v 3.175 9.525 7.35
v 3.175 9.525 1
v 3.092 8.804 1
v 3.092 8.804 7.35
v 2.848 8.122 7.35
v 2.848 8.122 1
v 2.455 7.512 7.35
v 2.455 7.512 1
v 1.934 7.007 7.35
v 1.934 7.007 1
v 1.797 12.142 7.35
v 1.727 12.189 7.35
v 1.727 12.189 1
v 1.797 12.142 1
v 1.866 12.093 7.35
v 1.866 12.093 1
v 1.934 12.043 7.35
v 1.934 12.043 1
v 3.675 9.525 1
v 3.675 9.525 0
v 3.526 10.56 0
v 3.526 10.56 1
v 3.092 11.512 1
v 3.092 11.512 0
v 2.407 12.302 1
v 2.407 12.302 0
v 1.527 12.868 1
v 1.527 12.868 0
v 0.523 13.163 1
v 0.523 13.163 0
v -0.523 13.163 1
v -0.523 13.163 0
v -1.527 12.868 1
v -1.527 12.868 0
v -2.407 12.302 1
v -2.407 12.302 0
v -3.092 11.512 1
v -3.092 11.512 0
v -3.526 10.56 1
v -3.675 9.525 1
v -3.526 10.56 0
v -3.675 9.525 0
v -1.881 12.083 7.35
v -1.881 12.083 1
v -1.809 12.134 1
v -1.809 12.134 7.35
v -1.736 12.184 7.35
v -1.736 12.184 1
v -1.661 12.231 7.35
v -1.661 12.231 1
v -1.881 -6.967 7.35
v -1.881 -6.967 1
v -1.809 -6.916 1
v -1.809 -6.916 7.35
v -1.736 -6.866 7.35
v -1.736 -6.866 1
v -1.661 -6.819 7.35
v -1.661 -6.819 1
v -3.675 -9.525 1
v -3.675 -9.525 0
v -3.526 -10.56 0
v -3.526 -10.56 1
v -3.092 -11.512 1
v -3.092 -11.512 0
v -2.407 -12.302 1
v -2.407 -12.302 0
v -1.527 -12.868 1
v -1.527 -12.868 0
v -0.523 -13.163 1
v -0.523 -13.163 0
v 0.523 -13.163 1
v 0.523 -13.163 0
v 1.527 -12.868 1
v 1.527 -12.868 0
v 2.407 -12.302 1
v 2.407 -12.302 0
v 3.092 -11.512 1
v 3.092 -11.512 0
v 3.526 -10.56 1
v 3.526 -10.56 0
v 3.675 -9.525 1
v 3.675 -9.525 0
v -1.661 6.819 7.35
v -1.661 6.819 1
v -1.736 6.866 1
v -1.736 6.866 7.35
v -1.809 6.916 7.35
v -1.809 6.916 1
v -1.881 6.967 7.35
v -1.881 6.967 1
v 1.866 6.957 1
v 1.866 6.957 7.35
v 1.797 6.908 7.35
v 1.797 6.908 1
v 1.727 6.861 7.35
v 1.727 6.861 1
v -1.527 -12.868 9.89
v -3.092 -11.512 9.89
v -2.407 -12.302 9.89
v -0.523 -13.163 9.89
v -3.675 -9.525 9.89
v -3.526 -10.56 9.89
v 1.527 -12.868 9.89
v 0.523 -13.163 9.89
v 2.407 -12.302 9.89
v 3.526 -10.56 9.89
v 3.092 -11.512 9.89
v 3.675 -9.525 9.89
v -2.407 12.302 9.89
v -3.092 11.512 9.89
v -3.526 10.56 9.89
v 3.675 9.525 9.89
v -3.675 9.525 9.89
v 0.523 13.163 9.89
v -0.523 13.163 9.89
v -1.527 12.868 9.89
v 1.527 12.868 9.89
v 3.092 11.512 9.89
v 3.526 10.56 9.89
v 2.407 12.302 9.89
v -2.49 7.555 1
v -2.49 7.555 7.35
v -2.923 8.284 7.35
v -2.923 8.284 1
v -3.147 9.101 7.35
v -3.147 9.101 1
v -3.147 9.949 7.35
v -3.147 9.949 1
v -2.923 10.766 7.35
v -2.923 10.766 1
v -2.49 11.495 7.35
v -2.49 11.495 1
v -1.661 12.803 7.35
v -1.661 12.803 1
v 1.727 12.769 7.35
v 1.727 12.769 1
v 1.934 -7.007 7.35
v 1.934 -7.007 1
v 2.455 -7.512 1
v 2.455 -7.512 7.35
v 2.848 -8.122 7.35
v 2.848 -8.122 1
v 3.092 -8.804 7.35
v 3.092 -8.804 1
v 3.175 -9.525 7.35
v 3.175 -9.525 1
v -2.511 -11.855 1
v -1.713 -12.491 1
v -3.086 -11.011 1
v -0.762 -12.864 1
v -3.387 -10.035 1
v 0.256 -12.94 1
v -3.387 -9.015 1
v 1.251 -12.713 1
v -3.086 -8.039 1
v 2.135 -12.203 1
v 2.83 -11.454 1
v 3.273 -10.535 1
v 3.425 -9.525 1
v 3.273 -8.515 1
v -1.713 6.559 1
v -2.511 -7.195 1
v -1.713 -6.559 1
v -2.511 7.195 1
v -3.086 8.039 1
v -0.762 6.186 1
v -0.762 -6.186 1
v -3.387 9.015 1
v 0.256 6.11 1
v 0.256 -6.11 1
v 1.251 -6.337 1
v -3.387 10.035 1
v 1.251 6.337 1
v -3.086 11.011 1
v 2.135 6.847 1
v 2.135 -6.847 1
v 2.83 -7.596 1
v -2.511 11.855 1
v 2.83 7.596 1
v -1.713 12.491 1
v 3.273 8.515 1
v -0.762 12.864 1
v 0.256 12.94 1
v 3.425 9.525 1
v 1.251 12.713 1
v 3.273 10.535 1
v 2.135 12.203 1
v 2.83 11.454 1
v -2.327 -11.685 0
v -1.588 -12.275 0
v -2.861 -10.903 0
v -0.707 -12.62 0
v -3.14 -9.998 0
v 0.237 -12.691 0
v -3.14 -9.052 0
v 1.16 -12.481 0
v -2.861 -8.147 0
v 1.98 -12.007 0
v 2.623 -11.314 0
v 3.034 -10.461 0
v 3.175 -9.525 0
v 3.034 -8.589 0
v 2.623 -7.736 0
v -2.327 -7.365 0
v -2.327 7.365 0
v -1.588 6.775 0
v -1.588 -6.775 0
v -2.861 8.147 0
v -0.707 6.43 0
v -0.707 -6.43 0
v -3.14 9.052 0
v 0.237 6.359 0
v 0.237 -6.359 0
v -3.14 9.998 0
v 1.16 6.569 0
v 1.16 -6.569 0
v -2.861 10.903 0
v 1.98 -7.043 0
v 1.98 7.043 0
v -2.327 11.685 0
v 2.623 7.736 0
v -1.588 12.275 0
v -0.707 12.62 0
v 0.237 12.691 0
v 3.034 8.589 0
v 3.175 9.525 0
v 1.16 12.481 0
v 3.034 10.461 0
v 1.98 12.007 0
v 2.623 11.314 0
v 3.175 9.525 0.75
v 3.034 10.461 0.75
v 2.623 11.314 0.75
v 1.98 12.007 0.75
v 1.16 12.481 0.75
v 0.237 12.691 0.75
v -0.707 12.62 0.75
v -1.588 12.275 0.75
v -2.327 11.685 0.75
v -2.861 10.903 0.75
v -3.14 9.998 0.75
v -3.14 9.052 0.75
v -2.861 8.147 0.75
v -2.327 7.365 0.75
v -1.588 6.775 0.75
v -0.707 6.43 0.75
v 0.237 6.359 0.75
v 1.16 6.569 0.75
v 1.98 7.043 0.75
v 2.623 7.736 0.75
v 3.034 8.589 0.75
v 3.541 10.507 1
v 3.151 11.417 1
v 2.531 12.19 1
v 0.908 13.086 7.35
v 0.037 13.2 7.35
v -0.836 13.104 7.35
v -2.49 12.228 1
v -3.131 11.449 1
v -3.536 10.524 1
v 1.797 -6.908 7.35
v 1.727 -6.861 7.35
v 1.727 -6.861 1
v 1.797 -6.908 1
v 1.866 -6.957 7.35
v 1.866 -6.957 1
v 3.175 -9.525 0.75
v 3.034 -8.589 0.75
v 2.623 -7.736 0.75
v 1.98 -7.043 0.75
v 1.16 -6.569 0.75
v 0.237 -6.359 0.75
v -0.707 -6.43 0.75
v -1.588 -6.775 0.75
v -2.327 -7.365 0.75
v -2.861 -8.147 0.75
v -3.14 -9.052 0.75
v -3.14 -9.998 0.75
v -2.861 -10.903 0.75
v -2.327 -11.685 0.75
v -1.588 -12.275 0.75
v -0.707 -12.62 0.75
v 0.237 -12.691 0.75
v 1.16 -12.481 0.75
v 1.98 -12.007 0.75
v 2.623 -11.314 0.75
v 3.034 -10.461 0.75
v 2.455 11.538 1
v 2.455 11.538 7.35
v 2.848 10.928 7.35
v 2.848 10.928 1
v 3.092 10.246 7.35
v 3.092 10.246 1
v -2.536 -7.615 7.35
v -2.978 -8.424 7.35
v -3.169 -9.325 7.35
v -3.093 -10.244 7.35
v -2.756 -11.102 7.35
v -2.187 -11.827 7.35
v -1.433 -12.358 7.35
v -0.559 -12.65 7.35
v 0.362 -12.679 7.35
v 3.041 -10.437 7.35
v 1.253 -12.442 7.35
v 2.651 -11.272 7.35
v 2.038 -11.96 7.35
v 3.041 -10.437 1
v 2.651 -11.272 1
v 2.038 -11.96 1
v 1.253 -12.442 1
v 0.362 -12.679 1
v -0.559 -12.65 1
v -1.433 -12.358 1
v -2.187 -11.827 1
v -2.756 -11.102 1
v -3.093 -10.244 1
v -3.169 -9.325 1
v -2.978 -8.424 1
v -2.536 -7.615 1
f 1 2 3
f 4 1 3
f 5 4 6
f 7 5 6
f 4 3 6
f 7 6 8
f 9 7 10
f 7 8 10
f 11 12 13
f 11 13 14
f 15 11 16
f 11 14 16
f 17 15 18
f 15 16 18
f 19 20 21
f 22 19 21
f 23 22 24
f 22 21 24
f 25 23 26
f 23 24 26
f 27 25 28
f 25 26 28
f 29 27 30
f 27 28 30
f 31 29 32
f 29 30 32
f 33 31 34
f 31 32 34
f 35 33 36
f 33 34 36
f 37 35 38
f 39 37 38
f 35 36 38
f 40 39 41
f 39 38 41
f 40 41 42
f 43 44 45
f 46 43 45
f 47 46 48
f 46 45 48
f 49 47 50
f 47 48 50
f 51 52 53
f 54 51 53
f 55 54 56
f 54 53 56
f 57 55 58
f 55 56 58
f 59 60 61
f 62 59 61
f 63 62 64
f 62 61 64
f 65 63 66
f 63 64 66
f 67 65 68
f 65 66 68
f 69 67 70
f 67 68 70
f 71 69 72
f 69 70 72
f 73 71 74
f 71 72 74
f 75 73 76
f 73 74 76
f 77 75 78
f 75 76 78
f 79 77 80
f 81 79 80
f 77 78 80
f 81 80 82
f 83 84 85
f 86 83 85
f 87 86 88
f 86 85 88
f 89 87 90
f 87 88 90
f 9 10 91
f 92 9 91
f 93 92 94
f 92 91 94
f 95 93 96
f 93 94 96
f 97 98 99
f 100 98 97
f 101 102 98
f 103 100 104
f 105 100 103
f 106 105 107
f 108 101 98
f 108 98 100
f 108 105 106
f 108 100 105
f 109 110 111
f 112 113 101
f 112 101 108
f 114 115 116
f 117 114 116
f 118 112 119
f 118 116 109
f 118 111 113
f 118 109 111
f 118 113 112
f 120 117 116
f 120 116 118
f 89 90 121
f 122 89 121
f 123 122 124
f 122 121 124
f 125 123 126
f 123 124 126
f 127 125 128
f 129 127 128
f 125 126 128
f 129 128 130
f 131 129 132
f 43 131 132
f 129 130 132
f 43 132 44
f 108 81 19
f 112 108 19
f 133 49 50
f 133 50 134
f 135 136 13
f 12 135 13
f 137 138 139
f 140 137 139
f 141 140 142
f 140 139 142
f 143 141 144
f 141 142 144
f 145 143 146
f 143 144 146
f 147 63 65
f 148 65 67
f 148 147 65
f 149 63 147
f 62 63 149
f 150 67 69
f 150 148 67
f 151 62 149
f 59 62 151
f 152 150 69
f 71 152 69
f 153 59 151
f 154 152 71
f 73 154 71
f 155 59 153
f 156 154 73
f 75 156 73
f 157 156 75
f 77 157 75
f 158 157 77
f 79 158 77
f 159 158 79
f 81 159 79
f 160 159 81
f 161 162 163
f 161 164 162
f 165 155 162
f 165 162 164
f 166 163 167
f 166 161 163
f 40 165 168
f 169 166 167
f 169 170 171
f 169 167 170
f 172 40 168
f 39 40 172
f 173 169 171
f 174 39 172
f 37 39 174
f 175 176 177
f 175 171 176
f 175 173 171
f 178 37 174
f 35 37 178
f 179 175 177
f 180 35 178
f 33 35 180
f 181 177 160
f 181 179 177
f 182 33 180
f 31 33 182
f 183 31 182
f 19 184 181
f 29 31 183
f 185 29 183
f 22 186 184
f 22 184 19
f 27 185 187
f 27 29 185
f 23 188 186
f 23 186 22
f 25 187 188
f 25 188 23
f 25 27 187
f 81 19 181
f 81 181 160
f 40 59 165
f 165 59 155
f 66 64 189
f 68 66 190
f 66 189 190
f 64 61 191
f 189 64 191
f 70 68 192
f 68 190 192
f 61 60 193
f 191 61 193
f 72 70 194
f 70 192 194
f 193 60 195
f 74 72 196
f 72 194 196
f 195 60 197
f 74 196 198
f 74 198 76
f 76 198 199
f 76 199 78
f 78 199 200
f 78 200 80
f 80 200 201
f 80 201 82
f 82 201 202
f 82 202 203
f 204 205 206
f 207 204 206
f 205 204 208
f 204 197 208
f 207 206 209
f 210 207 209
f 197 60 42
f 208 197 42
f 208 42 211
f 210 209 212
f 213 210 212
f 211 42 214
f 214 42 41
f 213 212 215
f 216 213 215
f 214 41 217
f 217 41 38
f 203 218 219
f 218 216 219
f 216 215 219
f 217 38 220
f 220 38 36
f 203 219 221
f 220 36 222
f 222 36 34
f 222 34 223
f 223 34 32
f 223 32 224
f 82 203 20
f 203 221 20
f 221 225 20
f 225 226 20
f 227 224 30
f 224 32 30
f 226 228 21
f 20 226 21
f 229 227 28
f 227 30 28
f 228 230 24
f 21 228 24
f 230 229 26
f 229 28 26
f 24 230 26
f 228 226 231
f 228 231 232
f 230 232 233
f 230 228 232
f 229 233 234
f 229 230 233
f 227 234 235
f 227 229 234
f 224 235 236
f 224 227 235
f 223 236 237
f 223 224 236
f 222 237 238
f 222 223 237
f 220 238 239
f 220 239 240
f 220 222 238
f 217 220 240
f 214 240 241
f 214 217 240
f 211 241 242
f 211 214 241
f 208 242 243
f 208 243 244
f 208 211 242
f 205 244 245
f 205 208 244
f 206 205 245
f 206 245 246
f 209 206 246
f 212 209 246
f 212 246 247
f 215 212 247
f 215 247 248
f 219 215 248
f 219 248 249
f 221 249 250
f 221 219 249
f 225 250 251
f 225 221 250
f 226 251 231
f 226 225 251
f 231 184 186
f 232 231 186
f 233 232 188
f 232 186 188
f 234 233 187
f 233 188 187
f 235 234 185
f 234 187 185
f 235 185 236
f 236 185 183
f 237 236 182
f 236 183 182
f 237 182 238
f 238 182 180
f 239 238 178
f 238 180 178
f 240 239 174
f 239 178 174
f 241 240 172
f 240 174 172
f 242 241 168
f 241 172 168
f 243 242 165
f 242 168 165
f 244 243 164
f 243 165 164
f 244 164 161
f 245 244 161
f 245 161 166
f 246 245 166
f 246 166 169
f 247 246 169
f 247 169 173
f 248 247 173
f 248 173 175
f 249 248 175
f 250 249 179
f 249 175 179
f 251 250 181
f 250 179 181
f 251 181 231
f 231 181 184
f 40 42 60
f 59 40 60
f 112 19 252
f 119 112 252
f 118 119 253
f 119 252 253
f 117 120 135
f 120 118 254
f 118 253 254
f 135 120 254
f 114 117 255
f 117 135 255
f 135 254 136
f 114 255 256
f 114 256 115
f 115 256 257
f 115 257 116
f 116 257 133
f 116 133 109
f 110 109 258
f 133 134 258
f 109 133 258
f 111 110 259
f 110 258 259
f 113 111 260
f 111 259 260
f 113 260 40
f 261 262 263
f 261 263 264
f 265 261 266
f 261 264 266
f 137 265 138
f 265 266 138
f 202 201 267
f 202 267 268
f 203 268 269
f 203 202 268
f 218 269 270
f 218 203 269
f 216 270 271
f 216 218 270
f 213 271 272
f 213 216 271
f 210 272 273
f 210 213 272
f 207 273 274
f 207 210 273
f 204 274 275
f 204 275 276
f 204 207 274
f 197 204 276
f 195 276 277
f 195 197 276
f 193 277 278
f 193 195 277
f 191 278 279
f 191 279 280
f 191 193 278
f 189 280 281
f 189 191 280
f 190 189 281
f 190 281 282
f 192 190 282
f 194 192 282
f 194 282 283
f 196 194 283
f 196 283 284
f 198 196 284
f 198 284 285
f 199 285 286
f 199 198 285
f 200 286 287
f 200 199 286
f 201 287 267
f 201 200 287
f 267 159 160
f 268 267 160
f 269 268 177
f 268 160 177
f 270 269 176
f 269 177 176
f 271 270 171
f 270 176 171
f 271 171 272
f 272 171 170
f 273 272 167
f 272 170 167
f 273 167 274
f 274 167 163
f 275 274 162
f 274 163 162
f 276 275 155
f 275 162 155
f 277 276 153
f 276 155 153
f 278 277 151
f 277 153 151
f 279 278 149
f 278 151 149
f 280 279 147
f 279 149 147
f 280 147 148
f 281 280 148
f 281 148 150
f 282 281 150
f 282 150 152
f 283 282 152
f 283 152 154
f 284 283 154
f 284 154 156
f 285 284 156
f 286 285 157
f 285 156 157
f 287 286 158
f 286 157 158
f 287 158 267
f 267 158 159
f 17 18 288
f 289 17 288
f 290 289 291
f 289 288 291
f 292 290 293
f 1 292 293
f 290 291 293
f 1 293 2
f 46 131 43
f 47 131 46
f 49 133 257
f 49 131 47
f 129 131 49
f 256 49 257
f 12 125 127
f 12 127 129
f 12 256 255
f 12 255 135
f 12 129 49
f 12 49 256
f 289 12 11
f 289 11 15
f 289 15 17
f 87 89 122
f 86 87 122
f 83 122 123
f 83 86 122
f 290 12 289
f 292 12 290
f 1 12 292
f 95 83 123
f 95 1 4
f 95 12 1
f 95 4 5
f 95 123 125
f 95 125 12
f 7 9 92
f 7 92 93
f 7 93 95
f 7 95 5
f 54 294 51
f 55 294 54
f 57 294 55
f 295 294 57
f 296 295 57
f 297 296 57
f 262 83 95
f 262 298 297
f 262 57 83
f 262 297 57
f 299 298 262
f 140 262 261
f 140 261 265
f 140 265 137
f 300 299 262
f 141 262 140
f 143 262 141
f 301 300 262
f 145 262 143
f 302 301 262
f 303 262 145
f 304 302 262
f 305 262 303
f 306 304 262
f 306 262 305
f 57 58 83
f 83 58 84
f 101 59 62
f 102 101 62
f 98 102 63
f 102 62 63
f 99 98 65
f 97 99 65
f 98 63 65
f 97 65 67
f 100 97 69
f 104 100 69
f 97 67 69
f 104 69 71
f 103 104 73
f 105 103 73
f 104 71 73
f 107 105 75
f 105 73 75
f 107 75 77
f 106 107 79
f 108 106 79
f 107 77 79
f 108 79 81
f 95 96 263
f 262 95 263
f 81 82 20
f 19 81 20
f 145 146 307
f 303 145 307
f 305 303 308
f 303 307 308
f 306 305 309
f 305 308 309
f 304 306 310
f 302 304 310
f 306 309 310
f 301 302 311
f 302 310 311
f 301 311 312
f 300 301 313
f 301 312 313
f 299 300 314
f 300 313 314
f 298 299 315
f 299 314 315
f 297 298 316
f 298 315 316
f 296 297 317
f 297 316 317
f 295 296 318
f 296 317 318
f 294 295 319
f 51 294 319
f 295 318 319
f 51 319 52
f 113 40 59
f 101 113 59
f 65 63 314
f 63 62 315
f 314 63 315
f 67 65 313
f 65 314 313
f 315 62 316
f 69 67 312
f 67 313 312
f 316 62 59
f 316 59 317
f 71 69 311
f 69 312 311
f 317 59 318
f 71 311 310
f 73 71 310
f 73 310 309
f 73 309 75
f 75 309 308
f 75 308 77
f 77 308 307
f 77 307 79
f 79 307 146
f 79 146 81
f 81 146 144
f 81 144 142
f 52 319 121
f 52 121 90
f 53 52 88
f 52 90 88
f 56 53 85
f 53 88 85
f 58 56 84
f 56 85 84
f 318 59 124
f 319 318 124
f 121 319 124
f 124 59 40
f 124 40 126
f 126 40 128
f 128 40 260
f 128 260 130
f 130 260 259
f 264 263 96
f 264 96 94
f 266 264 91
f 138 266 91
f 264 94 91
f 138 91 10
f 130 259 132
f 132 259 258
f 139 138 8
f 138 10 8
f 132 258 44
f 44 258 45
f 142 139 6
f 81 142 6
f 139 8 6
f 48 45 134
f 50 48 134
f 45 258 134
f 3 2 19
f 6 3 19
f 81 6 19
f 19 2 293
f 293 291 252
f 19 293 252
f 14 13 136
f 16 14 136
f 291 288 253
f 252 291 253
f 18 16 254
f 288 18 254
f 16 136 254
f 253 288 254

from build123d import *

# Parameters (mm, degrees)
F0_R     = 3.175
F1_DEPTH = 1
F2_SIZE  = 0.25
F3_DEPTH = 8.89
F6_DEPTH = 6.35
F8_DEPTH = 6.35


with BuildPart() as f1:
    # F0 (on Top) → F1 (new body)
    with BuildSketch(Plane.XY):
        with BuildLine():
            Line((3.675, -9.525), (3.675, 9.525))
            ThreePointArc((3.675, 9.525), (0, 5.85), (-3.675, 9.525))
            Line((-3.675, 9.525), (-3.675, -9.525))
            ThreePointArc((-3.675, -9.525), (0, -5.85), (3.675, -9.525))
        make_face()
        with BuildLine():
            ThreePointArc((-3.675, 9.525), (0, 5.85), (3.675, 9.525))
            ThreePointArc((3.675, 9.525), (0, 13.2), (-3.675, 9.525))
        make_face()
        with Locations((0, 9.525)):
            Circle(F0_R, mode=Mode.SUBTRACT)
        with BuildLine():
            ThreePointArc((-3.675, -9.525), (0, -13.2), (3.675, -9.525))
            ThreePointArc((3.675, -9.525), (0, -5.85), (-3.675, -9.525))
        make_face()
        with Locations((0, -9.525)):
            Circle(F0_R, mode=Mode.SUBTRACT)
    extrude(amount=F1_DEPTH)

    # F2
    f2_edges = [f1.edges().sort_by_distance(p)[0] for p in [
        (-3.175, -9.525, 1),
        (-3.175, 9.525, 1),
    ]]
    chamfer(f2_edges, length=F2_SIZE)


with BuildPart() as f3:
    # F0 (on Top) → F3 (new body)
    with BuildSketch(Plane.XY):
        with BuildLine():
            ThreePointArc((-3.675, 9.525), (0, 5.85), (3.675, 9.525))
            ThreePointArc((3.675, 9.525), (0, 13.2), (-3.675, 9.525))
        make_face()
        with Locations((0, 9.525)):
            Circle(F0_R, mode=Mode.SUBTRACT)
        with Locations((0, 9.525)):
            Circle(F0_R)
        with BuildLine():
            Line((3.675, -9.525), (3.675, 9.525))
            ThreePointArc((3.675, 9.525), (0, 5.85), (-3.675, 9.525))
            Line((-3.675, 9.525), (-3.675, -9.525))
            ThreePointArc((-3.675, -9.525), (0, -5.85), (3.675, -9.525))
        make_face()
        with BuildLine():
            ThreePointArc((-3.675, -9.525), (0, -13.2), (3.675, -9.525))
            ThreePointArc((3.675, -9.525), (0, -5.85), (-3.675, -9.525))
        make_face()
        with Locations((0, -9.525)):
            Circle(F0_R, mode=Mode.SUBTRACT)
        with Locations((0, -9.525)):
            Circle(F0_R)
    extrude(amount=F3_DEPTH)


with BuildPart() as f3_1:
    # F4: moved
    add(f3.part.moved(Location((0, 0, 1))))

    # F5 (on face) → F6 (cut)
    with BuildSketch(Plane(origin=(0, 0, 1), x_dir=(1, 0, 0), z_dir=(0, 0, -1))):
        with BuildLine():
            Line((-1.8806655426, 7.9525317997), (-1.8806655426, 6.9669300015))
            ThreePointArc((-1.8806655426, 6.9669300015), (0.0335689365, 6.3501774654), (1.9343344574, 7.0072678445))
            Line((1.9343344574, 7.0072678445), (1.9343344574, 7.9525317997))
            Line((1.9343344574, 7.9525317997), (-1.8806655426, 7.9525317997))
        make_face()
        with BuildLine():
            ThreePointArc((1.9343344574, 7.0072678445), (2.847993759, 8.1215910971), (3.175, 9.525))
            ThreePointArc((3.175, 9.525), (-1.4334419944, 12.3579964788), (-1.8806655426, 6.9669300015))
            Line((-1.8806655426, 6.9669300015), (-1.8806655426, 7.9525317997))
            Line((-1.8806655426, 7.9525317997), (1.9343344574, 7.9525317997))
            Line((1.9343344574, 7.9525317997), (1.9343344574, 7.0072678445))
        make_face()
        with BuildLine():
            ThreePointArc((1.9343344574, -7.0072678445), (0.0335689365, -6.3501774654), (-1.8806655426, -6.9669300015))
            Line((-1.8806655426, -6.9669300015), (-1.8806655426, -12.0830699985))
            ThreePointArc((-1.8806655426, -12.0830699985), (0.0335689365, -12.6998225346), (1.9343344574, -12.0427321555))
            Line((1.9343344574, -12.0427321555), (1.9343344574, -7.0072678445))
        make_face()
        with BuildLine():
            ThreePointArc((3.175, -9.525), (2.847993759, -8.1215910971), (1.9343344574, -7.0072678445))
            Line((1.9343344574, -7.0072678445), (1.9343344574, -12.0427321555))
            ThreePointArc((1.9343344574, -12.0427321555), (2.847993759, -10.9284089029), (3.175, -9.525))
        make_face()
        with BuildLine():
            Line((-1.8806655426, -12.0830699985), (-1.8806655426, -6.9669300015))
            ThreePointArc((-1.8806655426, -6.9669300015), (-3.175, -9.525), (-1.8806655426, -12.0830699985))
        make_face()
    extrude(amount=-F6_DEPTH, mode=Mode.SUBTRACT)

    # F7 (on face) → F8 (cut)
    with BuildSketch(Plane(origin=(0, 0, 1), x_dir=(1, 0, 0), z_dir=(0, 0, -1))):
        with BuildLine():
            Line((1.7267590156, 6.8606185892), (1.7267590156, 9.8988795653))
            Line((1.7267590156, 9.8988795653), (-1.6613168409, 9.8988795653))
            Line((-1.6613168409, 9.8988795653), (-1.6613168409, 6.8193297773))
            ThreePointArc((-1.6613168409, 6.8193297773), (0.0386892886, 6.3502357349), (1.7267590156, 6.8606185892))
        make_face()
        with BuildLine():
            Line((1.7267590156, -6.8606185892), (1.7267590156, 6.8606185892))
            ThreePointArc((1.7267590156, 6.8606185892), (0.0386892886, 6.3502357349), (-1.6613168409, 6.8193297773))
            Line((-1.6613168409, 6.8193297773), (-1.6613168409, -6.8193297773))
            ThreePointArc((-1.6613168409, -6.8193297773), (0.0386892886, -6.3502357349), (1.7267590156, -6.8606185892))
        make_face()
        with BuildLine():
            Line((1.7267590156, -12.1893814108), (1.7267590156, -6.8606185892))
            ThreePointArc((1.7267590156, -6.8606185892), (0.0386892886, -6.3502357349), (-1.6613168409, -6.8193297773))
            Line((-1.6613168409, -6.8193297773), (-1.6613168409, -12.2306702227))
            ThreePointArc((-1.6613168409, -12.2306702227), (0.0386892886, -12.6997642651), (1.7267590156, -12.1893814108))
        make_face()
        with BuildLine():
            Line((1.7267590156, -12.7690604652), (1.7267590156, -12.1893814108))
            ThreePointArc((1.7267590156, -12.1893814108), (0.0386892886, -12.6997642651), (-1.6613168409, -12.2306702227))
            Line((-1.6613168409, -12.2306702227), (-1.6613168409, -12.8030560328))
            ThreePointArc((-1.6613168409, -12.8030560328), (0.0368726757, -13.1998150165), (1.7267590156, -12.7690604652))
        make_face()
        with BuildLine():
            Line((1.7267590156, -17.7644323558), (1.7267590156, -12.7690604652))
            ThreePointArc((1.7267590156, -12.7690604652), (0.0368726757, -13.1998150165), (-1.6613168409, -12.8030560328))
            Line((-1.6613168409, -12.8030560328), (-1.6613168409, -17.7644323558))
            Line((-1.6613168409, -17.7644323558), (1.7267590156, -17.7644323558))
        make_face()
    extrude(amount=-F8_DEPTH, mode=Mode.SUBTRACT)


solid = Compound([f1.part, f3_1.part])
